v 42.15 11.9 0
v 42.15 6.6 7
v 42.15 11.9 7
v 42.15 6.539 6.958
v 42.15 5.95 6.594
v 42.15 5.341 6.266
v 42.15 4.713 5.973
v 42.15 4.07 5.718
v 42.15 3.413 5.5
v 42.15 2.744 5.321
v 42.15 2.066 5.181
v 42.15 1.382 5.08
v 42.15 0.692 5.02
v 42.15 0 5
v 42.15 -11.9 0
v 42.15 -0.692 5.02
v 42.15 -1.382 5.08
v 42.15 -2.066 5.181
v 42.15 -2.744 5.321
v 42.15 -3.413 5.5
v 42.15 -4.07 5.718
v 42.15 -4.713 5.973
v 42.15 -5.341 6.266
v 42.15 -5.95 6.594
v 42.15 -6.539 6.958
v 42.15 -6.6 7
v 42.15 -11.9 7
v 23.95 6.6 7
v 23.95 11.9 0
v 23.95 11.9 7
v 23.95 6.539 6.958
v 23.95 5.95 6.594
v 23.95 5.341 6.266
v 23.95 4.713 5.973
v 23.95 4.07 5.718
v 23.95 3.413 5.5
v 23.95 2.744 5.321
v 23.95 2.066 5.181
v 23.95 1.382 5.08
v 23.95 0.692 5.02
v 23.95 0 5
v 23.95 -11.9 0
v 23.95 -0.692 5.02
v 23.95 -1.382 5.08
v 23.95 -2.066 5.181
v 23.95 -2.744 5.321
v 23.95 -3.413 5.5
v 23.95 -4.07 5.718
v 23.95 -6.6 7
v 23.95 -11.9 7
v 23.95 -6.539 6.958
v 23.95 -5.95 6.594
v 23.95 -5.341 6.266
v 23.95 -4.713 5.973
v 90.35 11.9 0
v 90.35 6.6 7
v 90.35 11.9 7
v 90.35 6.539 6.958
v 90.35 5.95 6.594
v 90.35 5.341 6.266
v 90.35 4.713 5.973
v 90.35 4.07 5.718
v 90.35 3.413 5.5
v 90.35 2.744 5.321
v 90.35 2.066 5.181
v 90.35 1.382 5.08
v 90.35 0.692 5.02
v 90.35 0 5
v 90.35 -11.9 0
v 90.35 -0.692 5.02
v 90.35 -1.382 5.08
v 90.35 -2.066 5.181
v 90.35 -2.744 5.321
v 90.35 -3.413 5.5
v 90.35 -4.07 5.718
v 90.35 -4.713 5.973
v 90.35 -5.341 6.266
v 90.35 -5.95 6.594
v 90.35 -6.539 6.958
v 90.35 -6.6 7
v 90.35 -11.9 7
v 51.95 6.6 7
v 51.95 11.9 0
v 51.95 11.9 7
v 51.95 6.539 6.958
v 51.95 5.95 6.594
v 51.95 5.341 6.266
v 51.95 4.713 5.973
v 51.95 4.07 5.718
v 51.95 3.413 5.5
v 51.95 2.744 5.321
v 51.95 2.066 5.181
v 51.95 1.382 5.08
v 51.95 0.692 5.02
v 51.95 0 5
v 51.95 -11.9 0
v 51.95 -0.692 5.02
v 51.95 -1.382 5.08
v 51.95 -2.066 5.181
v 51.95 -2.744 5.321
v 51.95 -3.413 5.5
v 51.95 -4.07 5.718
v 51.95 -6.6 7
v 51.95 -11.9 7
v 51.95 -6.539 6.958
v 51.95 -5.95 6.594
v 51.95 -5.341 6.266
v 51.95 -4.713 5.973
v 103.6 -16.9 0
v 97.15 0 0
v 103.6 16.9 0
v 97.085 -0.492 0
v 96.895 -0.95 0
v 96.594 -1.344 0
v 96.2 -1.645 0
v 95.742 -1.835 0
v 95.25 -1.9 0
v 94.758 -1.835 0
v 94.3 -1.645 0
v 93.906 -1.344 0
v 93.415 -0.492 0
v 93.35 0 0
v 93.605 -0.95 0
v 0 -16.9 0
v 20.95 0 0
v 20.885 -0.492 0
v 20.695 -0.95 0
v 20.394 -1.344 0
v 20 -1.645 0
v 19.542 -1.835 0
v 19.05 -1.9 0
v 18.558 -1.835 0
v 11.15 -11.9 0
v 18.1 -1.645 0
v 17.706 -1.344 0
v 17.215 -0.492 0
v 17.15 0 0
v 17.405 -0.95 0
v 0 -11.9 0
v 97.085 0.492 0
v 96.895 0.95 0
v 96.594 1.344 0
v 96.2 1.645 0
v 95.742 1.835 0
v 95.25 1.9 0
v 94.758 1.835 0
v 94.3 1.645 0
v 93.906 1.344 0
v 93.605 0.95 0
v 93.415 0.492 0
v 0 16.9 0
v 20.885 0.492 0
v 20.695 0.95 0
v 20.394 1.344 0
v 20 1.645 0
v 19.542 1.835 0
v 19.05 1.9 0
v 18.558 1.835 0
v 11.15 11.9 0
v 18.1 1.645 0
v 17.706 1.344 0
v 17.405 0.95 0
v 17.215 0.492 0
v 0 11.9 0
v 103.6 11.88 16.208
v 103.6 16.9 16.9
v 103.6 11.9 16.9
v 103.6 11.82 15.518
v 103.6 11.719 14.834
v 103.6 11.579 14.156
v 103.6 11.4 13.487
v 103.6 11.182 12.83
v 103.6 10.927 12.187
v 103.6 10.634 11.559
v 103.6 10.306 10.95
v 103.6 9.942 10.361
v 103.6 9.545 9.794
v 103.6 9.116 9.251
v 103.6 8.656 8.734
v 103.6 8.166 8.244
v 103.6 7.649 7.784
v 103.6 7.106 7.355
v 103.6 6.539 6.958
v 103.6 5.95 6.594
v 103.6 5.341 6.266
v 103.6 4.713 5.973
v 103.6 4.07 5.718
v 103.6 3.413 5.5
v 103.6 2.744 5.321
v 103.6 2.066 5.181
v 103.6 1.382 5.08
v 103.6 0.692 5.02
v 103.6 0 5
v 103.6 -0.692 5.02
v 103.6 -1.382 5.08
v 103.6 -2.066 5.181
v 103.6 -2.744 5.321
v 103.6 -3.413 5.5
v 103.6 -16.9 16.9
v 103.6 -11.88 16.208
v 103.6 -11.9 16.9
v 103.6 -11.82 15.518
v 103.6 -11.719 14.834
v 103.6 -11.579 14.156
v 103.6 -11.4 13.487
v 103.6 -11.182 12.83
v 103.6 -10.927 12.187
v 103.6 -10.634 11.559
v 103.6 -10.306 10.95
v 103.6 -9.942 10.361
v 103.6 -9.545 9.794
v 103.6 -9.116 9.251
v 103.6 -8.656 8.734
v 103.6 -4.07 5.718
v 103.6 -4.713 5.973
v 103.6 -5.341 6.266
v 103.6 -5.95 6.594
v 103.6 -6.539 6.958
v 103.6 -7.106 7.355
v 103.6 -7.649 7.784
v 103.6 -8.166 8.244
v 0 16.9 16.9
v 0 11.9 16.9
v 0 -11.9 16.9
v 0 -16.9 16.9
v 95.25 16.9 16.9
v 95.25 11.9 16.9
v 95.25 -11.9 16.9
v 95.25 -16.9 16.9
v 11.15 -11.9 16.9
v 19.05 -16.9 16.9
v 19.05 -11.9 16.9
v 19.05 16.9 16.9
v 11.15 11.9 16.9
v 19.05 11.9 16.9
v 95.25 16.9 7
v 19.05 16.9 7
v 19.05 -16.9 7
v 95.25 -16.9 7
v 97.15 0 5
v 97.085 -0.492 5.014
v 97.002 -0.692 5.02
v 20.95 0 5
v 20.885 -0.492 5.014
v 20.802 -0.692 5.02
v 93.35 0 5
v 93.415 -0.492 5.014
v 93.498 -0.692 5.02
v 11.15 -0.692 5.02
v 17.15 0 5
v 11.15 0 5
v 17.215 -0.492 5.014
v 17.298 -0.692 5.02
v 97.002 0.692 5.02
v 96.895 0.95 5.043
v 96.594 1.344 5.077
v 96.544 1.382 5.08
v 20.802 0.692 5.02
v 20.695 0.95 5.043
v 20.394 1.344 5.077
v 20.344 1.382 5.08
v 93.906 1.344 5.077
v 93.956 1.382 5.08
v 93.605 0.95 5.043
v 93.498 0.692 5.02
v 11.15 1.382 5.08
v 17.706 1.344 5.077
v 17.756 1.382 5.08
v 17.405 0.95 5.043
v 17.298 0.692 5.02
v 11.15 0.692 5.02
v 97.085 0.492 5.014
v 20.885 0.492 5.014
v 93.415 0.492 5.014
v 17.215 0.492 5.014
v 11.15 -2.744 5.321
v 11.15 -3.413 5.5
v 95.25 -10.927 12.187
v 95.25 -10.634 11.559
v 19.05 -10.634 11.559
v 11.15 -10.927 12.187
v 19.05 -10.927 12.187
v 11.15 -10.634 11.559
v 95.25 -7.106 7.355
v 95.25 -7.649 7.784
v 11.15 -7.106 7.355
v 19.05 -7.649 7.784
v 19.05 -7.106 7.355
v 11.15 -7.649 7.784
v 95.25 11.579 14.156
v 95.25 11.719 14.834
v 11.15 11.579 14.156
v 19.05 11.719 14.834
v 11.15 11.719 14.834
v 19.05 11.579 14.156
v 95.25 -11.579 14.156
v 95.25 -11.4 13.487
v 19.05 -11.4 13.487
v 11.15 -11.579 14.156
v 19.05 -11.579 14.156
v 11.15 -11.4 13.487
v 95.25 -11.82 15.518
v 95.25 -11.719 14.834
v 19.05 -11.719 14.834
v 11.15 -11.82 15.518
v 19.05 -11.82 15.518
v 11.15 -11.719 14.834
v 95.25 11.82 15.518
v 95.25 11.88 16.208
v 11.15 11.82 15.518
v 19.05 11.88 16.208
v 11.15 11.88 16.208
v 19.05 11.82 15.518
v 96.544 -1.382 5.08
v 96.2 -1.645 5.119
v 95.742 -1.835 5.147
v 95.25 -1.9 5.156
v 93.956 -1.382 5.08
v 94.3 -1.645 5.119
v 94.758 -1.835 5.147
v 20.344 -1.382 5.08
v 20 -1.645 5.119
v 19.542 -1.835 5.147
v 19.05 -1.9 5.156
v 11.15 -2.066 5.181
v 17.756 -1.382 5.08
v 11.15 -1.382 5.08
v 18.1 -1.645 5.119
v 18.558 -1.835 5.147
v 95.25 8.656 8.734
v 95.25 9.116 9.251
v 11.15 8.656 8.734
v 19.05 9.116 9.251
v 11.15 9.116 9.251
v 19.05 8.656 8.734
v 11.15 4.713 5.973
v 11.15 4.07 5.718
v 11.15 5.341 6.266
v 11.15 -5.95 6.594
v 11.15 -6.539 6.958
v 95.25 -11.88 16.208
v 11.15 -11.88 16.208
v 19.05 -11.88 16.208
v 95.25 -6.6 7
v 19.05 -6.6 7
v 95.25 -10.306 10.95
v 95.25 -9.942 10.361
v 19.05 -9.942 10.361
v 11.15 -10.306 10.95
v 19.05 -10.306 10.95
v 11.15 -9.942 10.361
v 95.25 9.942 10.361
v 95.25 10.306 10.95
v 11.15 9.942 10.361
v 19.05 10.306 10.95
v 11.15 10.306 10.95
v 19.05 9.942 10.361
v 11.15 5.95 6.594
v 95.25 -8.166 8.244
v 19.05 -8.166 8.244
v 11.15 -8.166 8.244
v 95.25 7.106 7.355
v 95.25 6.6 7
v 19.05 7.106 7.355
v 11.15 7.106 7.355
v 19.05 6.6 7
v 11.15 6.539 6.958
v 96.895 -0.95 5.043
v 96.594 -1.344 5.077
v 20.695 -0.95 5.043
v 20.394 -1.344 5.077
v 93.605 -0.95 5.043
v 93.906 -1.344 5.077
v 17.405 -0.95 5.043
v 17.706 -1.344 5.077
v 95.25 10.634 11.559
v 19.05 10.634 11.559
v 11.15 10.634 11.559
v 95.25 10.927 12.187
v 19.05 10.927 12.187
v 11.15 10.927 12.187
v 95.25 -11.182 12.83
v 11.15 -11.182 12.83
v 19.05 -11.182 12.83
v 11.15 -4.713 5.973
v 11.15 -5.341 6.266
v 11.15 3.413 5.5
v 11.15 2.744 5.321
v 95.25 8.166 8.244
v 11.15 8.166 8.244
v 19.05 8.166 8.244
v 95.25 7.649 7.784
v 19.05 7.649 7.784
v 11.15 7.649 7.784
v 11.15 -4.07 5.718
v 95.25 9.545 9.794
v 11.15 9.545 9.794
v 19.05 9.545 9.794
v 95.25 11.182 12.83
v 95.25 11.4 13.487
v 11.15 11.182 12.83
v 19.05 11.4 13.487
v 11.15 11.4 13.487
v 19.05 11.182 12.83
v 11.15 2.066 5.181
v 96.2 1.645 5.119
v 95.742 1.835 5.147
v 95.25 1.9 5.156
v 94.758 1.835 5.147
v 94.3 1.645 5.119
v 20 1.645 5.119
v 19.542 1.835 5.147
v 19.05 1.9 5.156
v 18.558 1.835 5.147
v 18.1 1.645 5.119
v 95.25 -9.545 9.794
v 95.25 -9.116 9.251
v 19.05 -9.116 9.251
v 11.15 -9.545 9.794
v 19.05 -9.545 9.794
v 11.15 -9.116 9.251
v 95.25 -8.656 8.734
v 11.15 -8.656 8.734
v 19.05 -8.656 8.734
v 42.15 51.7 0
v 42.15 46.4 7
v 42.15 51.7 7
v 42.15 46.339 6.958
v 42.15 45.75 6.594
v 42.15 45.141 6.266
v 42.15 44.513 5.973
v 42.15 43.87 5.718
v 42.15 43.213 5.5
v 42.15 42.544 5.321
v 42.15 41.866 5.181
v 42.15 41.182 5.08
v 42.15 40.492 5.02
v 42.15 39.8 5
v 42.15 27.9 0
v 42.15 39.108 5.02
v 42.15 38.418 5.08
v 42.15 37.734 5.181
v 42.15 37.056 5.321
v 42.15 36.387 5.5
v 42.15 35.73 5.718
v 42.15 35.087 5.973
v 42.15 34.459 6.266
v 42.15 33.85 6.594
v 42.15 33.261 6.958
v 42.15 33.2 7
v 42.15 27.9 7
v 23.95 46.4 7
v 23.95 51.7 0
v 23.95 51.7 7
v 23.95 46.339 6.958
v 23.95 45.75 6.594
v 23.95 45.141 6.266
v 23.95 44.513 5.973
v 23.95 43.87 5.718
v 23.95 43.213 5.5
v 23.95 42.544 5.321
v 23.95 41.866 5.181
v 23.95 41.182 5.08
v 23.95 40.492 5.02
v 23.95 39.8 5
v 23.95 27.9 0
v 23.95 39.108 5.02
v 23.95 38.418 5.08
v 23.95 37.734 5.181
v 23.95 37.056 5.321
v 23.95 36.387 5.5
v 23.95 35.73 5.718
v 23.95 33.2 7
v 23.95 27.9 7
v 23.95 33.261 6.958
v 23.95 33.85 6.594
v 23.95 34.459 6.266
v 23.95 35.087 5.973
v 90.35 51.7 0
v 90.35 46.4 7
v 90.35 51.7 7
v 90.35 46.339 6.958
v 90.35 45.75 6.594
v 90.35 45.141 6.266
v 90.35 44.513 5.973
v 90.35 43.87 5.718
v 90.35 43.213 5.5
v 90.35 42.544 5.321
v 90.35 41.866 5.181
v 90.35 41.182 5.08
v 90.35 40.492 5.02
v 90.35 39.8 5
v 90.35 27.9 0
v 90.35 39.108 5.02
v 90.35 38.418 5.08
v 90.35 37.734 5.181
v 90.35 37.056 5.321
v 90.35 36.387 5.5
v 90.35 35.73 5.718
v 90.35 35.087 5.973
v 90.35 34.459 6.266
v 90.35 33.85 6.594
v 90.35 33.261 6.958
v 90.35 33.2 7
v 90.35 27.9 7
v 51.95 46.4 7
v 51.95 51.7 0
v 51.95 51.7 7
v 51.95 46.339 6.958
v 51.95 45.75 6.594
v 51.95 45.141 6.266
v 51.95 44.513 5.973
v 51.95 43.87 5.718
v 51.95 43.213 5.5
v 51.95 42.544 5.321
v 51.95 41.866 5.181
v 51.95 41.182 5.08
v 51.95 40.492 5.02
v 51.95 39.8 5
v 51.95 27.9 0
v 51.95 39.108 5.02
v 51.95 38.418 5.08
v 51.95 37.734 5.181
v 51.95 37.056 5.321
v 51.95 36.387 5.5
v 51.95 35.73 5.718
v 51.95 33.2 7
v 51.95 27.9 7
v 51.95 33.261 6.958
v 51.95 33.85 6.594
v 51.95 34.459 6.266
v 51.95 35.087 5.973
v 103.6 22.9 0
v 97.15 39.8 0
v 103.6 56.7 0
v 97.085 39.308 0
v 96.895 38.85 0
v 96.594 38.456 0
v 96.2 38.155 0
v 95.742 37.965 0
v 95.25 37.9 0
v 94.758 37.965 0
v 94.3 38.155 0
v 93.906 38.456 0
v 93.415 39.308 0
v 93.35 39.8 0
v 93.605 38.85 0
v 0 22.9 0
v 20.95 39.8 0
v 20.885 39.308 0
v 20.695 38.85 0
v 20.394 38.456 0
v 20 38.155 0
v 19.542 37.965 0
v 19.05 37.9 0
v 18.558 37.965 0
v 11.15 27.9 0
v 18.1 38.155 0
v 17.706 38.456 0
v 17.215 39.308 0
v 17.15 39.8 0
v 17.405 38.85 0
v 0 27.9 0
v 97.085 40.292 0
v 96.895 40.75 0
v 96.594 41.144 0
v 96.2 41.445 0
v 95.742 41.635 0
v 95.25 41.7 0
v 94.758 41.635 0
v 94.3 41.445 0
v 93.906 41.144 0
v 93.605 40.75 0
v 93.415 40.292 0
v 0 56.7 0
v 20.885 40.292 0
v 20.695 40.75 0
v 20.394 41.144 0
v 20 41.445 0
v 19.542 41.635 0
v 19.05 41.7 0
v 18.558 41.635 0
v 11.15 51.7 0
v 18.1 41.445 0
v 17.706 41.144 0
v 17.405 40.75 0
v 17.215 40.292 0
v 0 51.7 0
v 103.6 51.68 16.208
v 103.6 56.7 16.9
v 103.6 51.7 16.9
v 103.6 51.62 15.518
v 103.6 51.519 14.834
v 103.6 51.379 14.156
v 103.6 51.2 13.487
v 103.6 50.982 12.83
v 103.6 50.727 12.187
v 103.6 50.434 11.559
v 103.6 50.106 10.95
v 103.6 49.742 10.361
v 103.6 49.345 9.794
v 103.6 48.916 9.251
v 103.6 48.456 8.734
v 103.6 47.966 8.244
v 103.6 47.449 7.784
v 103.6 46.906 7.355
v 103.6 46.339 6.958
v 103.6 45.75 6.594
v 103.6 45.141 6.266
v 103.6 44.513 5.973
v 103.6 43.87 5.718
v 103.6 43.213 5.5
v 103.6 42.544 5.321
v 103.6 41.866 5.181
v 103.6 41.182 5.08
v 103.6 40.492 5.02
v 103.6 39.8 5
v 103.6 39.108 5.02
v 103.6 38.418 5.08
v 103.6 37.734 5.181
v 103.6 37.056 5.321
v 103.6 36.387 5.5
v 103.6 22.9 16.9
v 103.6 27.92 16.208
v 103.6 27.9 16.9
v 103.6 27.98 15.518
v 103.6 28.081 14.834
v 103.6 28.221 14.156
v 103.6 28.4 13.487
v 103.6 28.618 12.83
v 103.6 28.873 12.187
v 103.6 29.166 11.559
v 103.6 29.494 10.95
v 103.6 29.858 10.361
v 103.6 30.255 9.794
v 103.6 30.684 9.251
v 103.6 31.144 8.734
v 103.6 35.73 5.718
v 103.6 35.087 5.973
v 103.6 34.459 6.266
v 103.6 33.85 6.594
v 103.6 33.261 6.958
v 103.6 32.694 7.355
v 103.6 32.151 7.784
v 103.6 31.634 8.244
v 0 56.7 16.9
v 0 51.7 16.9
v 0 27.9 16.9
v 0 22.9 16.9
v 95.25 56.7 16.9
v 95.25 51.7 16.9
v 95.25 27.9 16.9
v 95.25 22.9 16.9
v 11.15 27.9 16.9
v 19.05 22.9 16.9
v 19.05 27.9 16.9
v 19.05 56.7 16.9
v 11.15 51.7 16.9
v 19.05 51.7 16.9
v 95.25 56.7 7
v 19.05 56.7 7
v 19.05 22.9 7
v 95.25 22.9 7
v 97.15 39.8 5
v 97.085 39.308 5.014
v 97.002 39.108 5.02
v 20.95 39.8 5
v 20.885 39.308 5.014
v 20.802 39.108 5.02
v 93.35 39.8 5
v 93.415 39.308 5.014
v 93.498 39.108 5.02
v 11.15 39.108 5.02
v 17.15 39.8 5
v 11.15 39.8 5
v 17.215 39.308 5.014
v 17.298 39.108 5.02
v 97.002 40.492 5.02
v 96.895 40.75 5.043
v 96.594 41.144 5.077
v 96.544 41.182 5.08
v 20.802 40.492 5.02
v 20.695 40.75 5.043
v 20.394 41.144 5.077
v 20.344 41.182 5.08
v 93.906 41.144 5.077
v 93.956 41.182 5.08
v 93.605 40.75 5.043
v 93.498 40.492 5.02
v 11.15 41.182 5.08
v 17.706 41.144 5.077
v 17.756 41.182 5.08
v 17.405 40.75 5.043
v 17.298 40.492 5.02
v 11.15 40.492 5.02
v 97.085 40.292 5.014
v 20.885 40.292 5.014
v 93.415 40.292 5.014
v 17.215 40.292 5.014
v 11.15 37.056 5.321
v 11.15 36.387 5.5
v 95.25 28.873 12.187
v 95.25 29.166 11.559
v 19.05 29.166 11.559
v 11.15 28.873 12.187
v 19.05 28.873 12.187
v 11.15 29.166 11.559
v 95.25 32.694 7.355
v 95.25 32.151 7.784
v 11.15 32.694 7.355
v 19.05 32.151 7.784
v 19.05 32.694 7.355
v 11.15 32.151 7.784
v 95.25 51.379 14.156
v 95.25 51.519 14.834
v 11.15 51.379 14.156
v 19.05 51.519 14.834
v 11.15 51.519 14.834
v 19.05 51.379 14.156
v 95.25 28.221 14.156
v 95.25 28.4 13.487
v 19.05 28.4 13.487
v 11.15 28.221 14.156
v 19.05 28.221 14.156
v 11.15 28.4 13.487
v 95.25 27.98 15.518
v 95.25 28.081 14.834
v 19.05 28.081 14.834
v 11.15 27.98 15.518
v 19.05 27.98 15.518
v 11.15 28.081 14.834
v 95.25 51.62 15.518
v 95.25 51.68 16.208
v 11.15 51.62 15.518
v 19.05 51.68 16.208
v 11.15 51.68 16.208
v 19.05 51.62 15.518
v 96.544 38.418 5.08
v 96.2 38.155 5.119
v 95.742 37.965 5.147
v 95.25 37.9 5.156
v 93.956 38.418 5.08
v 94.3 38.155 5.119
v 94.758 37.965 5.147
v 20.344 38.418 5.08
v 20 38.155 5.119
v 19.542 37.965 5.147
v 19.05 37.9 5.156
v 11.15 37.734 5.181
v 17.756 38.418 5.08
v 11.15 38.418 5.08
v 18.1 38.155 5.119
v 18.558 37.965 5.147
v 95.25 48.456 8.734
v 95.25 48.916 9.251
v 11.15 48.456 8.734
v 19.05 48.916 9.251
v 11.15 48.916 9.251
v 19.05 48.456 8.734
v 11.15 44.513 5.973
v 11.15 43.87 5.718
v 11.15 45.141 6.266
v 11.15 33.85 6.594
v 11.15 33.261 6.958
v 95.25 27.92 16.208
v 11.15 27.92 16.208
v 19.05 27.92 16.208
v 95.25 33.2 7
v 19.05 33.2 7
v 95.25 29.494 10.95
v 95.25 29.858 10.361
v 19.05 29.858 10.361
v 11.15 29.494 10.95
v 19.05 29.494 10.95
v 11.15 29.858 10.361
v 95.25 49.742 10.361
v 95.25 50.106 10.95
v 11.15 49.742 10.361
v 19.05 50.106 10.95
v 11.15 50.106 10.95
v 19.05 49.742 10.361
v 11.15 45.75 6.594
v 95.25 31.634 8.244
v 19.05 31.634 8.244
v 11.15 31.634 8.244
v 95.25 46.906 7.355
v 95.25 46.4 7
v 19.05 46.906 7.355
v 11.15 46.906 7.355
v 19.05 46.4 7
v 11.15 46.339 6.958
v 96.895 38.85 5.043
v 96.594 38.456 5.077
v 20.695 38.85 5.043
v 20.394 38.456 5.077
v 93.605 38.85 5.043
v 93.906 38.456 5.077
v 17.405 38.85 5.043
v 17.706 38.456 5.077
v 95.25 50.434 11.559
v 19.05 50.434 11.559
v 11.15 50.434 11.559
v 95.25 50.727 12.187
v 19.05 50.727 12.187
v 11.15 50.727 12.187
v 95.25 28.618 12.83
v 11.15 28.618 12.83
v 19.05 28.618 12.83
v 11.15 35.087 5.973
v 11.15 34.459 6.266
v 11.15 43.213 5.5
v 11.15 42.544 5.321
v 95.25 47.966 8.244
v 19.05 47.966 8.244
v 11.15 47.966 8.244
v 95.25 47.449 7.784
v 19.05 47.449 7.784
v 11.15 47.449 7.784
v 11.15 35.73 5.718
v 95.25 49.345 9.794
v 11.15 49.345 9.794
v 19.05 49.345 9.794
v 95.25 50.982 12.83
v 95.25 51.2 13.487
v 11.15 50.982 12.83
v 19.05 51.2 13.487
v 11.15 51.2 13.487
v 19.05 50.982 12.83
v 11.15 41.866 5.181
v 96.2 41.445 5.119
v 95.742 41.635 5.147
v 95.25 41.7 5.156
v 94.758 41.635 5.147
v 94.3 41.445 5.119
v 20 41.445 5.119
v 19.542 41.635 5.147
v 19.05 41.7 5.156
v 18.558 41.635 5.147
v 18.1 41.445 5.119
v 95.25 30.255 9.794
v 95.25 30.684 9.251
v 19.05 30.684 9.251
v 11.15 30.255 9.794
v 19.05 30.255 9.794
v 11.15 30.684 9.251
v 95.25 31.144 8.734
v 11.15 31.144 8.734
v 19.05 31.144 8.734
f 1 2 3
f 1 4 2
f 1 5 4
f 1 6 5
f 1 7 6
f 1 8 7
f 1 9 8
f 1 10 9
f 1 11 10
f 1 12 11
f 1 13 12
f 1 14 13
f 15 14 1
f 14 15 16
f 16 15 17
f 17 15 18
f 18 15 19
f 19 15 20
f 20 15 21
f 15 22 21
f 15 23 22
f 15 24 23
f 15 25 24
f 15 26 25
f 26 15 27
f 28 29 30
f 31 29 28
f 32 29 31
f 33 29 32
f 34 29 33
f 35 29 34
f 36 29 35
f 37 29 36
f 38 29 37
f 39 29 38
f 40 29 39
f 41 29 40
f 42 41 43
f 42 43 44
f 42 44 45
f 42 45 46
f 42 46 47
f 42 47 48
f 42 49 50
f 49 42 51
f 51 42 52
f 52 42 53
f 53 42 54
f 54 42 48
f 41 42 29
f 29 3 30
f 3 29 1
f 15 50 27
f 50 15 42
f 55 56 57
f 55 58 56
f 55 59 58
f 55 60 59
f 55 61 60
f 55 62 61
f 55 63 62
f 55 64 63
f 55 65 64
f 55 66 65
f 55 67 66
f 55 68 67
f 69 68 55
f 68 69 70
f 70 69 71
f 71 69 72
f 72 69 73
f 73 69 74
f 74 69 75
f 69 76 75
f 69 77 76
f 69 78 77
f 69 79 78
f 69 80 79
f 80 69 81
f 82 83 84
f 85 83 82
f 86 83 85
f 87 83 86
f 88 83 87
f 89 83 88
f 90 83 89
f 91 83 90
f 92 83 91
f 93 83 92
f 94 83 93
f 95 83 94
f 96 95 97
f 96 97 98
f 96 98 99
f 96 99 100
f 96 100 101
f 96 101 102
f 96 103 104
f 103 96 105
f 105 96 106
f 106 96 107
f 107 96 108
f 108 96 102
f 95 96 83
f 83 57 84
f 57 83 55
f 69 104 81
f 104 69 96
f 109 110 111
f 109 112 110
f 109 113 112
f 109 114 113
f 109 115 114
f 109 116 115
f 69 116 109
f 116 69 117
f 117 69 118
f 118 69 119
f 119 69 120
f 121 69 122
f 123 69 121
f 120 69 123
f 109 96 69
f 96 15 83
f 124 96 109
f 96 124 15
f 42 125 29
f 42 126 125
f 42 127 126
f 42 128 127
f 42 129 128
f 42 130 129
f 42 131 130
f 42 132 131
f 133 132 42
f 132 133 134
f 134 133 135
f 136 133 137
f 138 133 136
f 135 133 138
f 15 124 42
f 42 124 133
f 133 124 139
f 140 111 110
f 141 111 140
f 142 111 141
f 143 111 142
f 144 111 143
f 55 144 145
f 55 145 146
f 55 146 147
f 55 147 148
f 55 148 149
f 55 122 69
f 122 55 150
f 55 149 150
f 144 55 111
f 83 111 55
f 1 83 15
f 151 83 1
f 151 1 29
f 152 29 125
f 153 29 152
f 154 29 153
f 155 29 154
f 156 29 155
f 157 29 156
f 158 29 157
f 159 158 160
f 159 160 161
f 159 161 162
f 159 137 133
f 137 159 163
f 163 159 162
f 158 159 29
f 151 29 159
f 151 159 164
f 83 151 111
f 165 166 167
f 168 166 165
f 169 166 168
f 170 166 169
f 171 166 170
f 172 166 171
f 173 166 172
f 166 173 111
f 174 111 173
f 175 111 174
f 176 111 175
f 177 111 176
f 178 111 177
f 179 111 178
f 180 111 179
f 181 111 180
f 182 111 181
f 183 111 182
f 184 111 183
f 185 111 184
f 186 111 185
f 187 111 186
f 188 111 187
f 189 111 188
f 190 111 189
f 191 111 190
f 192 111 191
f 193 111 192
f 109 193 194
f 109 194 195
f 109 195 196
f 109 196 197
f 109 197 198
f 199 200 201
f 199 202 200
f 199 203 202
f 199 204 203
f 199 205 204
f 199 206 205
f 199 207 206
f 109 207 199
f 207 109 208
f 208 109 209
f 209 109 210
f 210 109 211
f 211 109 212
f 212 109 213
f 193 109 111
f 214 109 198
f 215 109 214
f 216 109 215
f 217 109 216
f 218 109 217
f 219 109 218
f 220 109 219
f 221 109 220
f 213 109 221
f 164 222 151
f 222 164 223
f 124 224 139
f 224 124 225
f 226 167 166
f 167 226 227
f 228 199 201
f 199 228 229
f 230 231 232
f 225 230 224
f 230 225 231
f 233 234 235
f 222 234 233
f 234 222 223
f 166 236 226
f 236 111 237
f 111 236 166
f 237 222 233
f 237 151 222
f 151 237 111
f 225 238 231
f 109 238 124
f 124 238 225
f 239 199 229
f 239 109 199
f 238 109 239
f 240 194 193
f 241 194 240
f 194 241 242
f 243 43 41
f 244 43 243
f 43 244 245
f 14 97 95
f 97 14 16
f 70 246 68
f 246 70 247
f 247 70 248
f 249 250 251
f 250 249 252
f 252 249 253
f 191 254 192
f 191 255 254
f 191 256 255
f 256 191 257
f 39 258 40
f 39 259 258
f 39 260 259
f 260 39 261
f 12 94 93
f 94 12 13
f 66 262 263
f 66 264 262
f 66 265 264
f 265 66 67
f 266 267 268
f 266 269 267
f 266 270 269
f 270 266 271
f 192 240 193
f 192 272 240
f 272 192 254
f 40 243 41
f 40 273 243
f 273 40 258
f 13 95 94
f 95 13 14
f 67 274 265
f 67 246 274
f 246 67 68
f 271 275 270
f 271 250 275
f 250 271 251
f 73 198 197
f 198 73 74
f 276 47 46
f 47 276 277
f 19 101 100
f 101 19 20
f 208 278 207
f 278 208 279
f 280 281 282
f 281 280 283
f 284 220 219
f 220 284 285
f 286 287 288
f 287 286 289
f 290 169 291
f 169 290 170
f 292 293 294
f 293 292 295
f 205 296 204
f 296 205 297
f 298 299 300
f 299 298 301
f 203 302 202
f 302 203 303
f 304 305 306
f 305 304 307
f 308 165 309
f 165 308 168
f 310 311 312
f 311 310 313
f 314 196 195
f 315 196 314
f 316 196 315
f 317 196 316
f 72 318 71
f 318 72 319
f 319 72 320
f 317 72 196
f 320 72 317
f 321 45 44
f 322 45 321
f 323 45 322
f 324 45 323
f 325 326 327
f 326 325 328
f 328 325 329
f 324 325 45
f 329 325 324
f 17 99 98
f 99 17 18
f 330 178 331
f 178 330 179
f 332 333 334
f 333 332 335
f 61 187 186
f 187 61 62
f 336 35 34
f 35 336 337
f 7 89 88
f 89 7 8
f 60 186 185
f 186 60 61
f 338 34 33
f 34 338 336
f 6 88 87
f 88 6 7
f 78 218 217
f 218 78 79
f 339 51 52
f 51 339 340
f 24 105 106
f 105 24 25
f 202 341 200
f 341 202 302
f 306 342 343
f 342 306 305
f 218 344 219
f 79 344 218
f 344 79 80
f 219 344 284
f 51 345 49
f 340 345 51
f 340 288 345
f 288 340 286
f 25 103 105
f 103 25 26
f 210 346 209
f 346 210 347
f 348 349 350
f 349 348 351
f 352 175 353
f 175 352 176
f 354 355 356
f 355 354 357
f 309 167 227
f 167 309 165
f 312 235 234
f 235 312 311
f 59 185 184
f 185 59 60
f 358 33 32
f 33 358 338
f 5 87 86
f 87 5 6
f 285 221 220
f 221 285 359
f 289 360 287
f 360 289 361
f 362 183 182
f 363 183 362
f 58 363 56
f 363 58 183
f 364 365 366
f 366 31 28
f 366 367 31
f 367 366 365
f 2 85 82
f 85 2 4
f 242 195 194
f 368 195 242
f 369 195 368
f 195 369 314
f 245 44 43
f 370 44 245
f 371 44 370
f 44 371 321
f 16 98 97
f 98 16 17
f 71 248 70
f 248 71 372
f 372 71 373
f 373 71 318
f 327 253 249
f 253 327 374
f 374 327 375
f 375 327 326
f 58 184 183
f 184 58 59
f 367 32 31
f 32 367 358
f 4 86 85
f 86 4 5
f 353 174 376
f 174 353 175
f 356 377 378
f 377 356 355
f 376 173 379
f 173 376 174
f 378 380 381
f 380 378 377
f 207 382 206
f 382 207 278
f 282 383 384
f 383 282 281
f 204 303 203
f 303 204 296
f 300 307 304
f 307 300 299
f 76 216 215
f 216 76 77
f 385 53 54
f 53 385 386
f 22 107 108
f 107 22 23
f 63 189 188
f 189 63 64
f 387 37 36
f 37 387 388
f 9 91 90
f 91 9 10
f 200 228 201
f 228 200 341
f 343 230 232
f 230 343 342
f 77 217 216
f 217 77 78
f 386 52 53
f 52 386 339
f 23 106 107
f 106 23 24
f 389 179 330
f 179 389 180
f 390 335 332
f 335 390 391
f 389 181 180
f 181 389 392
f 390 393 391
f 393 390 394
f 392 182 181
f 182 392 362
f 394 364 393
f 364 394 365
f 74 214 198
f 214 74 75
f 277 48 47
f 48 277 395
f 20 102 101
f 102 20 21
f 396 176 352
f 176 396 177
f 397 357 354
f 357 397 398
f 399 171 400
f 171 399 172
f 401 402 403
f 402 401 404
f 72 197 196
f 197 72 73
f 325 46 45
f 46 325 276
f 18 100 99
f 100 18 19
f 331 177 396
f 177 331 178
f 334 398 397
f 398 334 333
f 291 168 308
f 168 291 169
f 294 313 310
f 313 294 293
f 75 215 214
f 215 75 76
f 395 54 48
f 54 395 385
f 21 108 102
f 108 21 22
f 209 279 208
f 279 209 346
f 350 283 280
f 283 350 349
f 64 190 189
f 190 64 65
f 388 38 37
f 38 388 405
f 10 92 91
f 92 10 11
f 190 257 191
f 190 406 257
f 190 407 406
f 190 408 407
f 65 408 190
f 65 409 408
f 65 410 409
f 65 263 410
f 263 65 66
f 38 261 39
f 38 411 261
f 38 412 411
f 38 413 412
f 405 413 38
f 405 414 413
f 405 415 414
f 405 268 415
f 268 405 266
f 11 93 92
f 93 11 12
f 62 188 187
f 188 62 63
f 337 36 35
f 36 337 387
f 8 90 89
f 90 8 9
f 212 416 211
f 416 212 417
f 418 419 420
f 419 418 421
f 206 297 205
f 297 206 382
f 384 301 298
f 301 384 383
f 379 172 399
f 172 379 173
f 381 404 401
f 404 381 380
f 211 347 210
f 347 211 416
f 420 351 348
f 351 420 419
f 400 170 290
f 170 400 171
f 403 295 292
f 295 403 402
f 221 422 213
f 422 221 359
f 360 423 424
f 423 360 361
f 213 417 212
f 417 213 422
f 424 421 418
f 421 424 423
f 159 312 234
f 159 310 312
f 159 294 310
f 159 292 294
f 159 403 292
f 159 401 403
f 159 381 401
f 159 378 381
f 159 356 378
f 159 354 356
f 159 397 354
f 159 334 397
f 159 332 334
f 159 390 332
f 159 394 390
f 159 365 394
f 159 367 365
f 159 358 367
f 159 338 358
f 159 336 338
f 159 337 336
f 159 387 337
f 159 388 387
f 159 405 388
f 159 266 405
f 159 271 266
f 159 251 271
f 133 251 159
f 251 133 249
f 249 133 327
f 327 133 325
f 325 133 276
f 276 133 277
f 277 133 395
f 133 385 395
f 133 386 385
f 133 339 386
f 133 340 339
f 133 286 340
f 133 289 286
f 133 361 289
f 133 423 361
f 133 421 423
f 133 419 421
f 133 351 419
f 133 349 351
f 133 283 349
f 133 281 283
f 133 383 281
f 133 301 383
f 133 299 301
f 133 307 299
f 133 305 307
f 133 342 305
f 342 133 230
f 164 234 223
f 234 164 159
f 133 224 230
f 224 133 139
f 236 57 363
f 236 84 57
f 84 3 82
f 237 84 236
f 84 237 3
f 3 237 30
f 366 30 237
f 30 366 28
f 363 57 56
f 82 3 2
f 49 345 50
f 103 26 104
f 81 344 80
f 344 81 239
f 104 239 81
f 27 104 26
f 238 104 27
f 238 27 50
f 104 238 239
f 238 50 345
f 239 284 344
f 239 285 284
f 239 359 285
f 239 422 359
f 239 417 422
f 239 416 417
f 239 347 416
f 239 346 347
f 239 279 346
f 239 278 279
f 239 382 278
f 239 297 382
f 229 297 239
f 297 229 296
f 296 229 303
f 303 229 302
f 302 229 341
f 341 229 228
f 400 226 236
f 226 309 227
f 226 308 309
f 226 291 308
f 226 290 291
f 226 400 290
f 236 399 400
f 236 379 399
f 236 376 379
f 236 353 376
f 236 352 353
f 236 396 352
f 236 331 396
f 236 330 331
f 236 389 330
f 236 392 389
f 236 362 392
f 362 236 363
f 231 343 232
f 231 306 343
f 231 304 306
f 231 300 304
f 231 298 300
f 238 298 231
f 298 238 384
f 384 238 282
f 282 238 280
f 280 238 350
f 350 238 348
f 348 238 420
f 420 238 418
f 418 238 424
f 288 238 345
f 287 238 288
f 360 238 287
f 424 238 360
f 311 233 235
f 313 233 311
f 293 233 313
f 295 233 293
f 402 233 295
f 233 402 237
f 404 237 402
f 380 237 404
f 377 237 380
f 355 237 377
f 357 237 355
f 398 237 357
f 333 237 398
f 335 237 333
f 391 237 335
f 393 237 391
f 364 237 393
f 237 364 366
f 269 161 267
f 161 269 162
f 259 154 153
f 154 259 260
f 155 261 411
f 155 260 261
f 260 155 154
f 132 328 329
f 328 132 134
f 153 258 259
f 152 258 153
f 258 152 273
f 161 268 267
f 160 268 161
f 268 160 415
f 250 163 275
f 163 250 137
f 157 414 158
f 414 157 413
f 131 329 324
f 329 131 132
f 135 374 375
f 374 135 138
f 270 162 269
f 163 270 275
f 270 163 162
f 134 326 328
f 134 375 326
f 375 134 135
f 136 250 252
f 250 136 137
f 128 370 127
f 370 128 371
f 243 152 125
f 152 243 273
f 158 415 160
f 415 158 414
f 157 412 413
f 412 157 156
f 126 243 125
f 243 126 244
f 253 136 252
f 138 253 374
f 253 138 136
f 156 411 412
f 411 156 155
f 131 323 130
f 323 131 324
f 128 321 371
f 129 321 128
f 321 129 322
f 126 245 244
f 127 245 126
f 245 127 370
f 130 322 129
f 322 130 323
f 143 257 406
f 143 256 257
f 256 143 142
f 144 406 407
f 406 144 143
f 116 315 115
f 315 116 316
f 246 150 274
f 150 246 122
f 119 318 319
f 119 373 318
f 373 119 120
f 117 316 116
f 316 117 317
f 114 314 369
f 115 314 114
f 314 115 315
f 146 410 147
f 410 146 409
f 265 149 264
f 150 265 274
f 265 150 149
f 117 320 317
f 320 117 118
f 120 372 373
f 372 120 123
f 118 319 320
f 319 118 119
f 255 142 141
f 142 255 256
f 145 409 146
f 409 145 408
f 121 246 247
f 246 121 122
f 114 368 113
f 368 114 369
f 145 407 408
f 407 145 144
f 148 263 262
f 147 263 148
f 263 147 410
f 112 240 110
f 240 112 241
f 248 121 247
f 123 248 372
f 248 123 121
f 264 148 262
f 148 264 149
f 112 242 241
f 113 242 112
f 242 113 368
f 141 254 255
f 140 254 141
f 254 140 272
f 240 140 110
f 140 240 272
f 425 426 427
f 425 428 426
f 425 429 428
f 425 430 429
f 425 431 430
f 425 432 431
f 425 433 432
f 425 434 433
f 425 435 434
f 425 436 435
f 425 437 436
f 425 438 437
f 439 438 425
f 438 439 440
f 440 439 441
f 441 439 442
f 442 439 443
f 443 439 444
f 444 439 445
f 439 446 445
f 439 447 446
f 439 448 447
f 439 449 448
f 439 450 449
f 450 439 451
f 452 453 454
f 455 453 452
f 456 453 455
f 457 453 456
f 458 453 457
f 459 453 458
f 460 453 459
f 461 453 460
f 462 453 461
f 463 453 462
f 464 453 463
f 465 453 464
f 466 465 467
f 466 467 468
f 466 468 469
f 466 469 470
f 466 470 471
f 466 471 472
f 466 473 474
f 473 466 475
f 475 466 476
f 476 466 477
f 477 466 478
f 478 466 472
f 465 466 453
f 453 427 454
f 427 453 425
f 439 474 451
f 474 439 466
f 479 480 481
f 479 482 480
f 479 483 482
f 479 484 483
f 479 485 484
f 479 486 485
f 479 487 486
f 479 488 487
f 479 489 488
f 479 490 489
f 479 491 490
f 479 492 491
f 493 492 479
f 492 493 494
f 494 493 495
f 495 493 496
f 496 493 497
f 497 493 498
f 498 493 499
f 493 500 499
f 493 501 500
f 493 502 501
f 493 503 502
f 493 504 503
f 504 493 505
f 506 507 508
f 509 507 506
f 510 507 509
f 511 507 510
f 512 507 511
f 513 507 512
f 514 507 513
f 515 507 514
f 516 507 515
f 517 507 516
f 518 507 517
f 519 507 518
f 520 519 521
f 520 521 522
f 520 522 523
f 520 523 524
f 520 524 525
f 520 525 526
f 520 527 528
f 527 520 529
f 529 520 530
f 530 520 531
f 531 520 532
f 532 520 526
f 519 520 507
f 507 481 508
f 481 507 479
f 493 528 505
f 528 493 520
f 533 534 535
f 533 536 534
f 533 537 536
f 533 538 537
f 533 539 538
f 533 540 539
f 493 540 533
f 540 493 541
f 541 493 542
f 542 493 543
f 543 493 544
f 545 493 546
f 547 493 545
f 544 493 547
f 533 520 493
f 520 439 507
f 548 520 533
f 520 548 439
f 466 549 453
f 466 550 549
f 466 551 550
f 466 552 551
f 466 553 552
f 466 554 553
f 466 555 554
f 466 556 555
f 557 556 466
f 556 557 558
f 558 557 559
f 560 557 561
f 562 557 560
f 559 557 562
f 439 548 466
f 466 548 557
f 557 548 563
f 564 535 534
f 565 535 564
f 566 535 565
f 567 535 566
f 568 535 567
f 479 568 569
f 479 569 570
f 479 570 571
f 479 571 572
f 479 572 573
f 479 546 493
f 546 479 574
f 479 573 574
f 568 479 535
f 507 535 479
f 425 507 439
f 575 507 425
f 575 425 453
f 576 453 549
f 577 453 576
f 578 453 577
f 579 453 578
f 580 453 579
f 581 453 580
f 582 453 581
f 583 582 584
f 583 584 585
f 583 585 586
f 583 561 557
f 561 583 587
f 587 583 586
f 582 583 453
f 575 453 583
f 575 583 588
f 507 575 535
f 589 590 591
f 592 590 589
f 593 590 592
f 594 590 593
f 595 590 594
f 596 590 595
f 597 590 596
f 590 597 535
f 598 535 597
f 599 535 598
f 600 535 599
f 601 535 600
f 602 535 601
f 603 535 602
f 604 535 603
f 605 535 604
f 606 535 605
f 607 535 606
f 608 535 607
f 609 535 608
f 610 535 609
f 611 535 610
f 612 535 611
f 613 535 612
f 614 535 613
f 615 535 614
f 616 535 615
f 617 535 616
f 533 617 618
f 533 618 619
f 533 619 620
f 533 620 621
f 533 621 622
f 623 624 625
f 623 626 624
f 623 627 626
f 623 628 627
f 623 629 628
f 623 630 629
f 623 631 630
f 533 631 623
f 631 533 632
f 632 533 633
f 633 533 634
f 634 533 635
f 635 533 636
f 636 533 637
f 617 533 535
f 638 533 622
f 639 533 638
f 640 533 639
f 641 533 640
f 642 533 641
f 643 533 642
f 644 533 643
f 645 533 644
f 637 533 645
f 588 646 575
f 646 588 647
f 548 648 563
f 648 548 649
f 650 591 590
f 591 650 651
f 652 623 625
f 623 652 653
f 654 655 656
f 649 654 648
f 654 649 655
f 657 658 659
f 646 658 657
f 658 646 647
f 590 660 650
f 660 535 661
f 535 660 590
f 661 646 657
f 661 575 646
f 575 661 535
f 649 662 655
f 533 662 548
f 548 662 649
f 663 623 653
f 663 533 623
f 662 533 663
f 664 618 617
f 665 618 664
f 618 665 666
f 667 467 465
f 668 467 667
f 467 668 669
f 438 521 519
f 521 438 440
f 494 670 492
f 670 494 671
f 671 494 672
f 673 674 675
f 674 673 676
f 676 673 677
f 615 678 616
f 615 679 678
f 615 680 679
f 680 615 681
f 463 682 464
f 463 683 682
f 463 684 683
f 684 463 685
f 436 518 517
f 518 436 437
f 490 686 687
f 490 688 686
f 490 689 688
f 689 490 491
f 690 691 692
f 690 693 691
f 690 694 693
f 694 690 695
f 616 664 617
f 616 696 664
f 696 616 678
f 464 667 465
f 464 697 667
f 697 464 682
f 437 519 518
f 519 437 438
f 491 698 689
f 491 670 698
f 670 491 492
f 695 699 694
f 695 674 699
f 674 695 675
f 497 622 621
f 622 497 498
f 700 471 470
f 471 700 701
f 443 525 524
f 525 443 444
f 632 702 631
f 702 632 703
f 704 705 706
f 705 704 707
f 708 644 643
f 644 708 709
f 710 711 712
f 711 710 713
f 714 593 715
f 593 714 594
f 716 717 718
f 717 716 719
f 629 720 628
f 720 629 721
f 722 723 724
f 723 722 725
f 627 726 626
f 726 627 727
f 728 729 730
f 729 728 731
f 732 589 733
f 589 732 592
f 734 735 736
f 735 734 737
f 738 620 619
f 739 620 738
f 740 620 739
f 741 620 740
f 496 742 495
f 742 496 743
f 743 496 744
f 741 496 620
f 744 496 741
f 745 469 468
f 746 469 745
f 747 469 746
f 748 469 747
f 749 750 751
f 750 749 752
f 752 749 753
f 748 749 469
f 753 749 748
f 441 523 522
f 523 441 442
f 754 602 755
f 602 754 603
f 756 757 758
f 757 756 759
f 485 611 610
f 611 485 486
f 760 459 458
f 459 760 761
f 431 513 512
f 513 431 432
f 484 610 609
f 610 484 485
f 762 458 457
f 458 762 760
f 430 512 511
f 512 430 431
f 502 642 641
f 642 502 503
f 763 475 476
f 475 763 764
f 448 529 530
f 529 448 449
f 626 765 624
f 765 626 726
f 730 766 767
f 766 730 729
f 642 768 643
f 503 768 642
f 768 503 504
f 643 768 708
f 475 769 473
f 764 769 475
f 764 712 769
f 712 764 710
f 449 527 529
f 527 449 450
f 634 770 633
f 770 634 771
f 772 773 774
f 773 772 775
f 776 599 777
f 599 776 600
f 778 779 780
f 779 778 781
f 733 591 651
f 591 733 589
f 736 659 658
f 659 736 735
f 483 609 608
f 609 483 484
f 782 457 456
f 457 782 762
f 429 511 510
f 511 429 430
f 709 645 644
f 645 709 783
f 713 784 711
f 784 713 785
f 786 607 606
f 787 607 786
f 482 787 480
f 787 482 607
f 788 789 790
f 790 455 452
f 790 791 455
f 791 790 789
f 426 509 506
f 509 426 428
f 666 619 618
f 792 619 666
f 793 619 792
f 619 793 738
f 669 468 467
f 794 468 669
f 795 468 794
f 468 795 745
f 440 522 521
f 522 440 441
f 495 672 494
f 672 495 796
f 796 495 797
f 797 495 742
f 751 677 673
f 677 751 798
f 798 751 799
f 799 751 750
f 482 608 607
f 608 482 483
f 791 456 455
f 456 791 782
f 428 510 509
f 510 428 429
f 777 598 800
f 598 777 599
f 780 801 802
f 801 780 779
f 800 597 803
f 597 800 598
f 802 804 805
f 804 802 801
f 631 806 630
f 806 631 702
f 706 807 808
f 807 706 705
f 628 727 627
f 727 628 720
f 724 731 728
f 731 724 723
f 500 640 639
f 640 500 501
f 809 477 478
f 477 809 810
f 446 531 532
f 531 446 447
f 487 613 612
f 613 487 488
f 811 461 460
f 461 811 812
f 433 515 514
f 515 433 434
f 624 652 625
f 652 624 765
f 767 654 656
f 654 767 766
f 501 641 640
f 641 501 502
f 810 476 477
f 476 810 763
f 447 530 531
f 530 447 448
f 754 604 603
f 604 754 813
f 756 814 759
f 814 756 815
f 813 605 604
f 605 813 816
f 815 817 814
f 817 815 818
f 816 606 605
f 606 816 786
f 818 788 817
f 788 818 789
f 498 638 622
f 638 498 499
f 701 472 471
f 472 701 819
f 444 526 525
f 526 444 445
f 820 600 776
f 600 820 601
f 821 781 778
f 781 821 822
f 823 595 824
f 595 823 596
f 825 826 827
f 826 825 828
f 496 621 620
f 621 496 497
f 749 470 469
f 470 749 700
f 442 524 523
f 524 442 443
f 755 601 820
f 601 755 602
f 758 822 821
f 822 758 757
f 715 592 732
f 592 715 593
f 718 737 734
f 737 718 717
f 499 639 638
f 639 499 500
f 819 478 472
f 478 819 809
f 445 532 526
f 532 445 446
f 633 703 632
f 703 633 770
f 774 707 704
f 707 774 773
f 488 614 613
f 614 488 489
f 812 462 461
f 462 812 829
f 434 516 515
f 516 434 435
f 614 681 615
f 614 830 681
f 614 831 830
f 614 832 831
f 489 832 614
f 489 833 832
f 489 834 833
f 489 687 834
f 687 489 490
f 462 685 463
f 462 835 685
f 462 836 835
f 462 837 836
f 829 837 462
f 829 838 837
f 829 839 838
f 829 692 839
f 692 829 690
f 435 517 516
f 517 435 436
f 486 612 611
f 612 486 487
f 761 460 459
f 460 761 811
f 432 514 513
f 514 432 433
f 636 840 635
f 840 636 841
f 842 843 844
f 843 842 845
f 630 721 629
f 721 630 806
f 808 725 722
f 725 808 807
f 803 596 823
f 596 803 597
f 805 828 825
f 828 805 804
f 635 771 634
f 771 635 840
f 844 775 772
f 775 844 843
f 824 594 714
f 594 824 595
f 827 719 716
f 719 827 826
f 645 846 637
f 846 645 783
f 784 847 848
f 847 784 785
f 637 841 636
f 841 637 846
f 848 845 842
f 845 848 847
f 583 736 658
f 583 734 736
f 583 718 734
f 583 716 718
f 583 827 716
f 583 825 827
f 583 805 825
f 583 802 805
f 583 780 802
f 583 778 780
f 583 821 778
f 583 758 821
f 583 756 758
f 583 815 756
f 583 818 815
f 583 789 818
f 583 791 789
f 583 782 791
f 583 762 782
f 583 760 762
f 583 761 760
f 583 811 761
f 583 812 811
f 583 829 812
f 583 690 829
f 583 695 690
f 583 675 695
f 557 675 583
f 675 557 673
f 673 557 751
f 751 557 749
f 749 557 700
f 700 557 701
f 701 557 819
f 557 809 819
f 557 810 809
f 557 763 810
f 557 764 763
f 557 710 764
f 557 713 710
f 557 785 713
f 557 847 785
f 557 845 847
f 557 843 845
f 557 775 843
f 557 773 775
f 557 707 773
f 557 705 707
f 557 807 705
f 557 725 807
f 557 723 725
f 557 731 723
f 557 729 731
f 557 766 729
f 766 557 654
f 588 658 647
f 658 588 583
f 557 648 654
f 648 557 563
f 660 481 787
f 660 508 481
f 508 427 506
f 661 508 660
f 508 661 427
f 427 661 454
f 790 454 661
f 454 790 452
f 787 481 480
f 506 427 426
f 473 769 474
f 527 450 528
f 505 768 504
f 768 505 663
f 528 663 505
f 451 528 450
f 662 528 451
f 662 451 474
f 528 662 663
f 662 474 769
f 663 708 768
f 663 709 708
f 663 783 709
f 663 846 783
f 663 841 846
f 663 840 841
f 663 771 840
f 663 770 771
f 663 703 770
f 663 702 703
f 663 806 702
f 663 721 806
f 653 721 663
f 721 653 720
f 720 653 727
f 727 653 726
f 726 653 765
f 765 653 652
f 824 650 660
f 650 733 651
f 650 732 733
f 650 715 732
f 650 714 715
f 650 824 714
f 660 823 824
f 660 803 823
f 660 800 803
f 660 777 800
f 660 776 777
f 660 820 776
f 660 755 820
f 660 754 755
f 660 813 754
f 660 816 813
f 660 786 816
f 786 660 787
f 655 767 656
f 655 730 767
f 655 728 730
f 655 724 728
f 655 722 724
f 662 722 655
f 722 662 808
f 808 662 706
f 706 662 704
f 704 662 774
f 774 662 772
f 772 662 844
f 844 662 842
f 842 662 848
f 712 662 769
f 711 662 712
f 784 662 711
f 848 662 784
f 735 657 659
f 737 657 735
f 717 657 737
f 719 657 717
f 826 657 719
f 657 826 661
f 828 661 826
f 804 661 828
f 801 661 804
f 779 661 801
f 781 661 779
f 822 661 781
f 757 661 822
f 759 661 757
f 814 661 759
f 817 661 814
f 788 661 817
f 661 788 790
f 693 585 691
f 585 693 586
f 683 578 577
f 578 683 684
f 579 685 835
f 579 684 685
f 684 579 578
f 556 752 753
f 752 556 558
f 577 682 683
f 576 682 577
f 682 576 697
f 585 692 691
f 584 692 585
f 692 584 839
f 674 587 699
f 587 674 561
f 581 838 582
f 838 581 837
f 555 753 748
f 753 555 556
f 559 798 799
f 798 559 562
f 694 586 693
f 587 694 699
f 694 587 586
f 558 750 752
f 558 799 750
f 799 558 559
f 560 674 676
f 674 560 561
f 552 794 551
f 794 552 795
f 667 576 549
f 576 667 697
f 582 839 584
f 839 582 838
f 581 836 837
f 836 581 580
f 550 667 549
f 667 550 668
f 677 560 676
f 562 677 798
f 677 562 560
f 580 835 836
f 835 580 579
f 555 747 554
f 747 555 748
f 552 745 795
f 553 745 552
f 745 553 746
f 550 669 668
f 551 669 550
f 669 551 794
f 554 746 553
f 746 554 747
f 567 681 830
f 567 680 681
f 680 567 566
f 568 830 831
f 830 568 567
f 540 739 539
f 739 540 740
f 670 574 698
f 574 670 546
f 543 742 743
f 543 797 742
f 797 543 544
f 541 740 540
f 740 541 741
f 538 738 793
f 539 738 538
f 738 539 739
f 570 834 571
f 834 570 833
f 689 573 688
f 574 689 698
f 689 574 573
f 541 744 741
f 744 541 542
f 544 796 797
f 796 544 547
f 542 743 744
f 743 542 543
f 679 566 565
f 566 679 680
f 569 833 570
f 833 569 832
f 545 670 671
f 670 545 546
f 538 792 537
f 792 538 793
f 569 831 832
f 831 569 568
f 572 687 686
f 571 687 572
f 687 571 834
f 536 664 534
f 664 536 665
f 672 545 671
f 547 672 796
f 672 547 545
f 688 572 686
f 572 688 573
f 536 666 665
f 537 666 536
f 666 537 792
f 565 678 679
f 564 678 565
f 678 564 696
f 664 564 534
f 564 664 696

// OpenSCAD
//Drill guide for Mostly Printed CNC Z Pipe
//7/3/2015  By: David Bunch
//Revised center cuts for larger Diameter holes to work better
//
//Revised 10/4/2015
//Designed for Bosch Toolholder with Dust cover using 2 parts
//76.25mm 1st & 3rd hole
//28.01mm 1st & 2nd hole
//48.24mm 2nd & 3rd hole

//Revised 8/5/2017 to make Wall thickness & Base Thickness separate variables & fixed one bug

//CUSTOMIZER VARIABLES

//1. Spacing between Nuts (Standard is 76.2mm)
NutSpacing = 76.2;      //(I used 53mm for the rotary tool I am using)

//2. Spacing between 1st & 2nd Nut
NutSpacing2 = 28;    //Use 0 if only using 2 nuts

//3. Dia of Drill Hole (9/64" Drill bit, Added .2mm for slip fit)
//M3 = 3.8;
DrSize = 3.8;

//4. Pipe Dia. to Use (Added 0.8 for slight tight fit)
OD = 23.8;              //23.7mm was a little tight & 24.0 was a little loose for me

//5. Thickness at bottom of Pipe
Thickness = 5;

//6. Thickness of Walls on each side of pipe
Wall_Thk = 5;

//7. Resolution of Pipe (108 gives .688mm length segments)
Pipe_res = 108;

//8. Resolution of holes (24 gives .497mm length segments)
Hole_res = 24;

//9. Offset from Left for 1st Nut Trap
LtNutOffset = 19.05;      //Original Design is 19.05mm

//10. Offset from Right of 2nd Nut Trap (Original is 6.35mm)
RtNutOffset = 8.35;       //(I decided to add 2mm to this gap)

//11. Center Clamp Width
Cl_Wid = 6;

//12. Number of Holes (1, 2 or 3)
Num_Holes=2;        //I needed 3 for the Bosch quick disconnect mount

//13. Print 1 or 2 Nut Traps
Qty = 2;

//CUSTOMIZER VARIABLES END
//----------------------------------------
//Begin calculations based on input variables
MidNutOffset = LtNutOffset + NutSpacing2;
echo("MidNutOffset = ", MidNutOffset);
TotCenGap=NutSpacing - DrSize - 12;         //I use 6mm plastic around holes
echo("TotCenGap = ",TotCenGap);

DrRad = DrSize / 2;
echo("DrRad = ", DrRad);
THK = OD /2 + Thickness;

DrLen = OD + Thickness + Thickness+2;

echo("THK = ",THK);

Width = OD + Wall_Thk + Wall_Thk;
echo("Width = ",Width);

WidSlice = Width + 2;
Rad = OD / 2;
echo("Rad = ", Rad);

Ht = LtNutOffset + NutSpacing + RtNutOffset;
echo("Ht = ", Ht);

CenCub_Z2 = LtNutOffset + DrRad + 3;         //6mm of plastic each side of hole

CenCub_Z1 = MidNutOffset + DrRad + 3;

CenCubLen1 = NutSpacing - NutSpacing2 - (6 + DrSize);                     //Use this if Cl_Wid = 0;
//CenCubLen2 = (TotCenGap - Cl_Wid) / 2;
CenCubLen2 = NutSpacing2 - (6 + DrSize);

echo("CenCubLen1 = ", CenCubLen1);
echo("CenCubLen2 = ", CenCubLen2);
//translate([LtNutOffset,0,0])
//%cube([DrRad + 3,4,10]);
module Base()
{
    translate([0,0,THK])
    rotate([0,90,0])
    difference()
    {
        translate([0,-Width/2,0])
        cube([THK,Width,Ht]);                   //Basic starting cube
        translate([0,0,-1])
        cylinder(d=OD,h=Ht+2,$fn=Pipe_res);     //Cut for where pipe is laid
        if (Cl_Wid > 0)
        {
            translate([-1,-Rad,CenCub_Z2])
            cube([THK+2,OD,CenCubLen2]);           //cube cut out of 1st part of center
            translate([-1,-Rad,CenCub_Z1])
            cube([THK+2,OD,CenCubLen1]);           //cube cut out of 2nd part of center
        } else {
            translate([-1,-Rad,CenCub_Z])
            cube([OD,OD,CenCubLen1]);          //cube cut out of center
        }
        translate([-1,-Rad,-1])
        cube([THK+2,OD,(LtNutOffset - DrRad - 6) + 1]);         //Slice a cube cut at left side
        translate([-(Thickness+2),-(WidSlice/2),LtNutOffset])
        cube([THK,WidSlice,NutSpacing]);        //Slice across Top for less plastic

        translate([0,0,LtNutOffset])
        rotate([0,90,0])
        cylinder(d=DrSize,h=DrLen,center=true,$fn=Hole_res);       //Drill Bottom Hole
        if (Num_Holes == 3)
        {
            translate([0,0,LtNutOffset+NutSpacing2])
            rotate([0,90,0])
            cylinder(d=DrSize,h=DrLen,center=true,$fn=Hole_res);       //Drill Middle Hole
        }
        if (Num_Holes > 1)
        {
                translate([0,0,LtNutOffset+NutSpacing])
                rotate([0,90,0])
                cylinder(d=DrSize,h=DrLen,center=true,$fn=Hole_res);    //Drill Top Hole
        }
    }
}
            //translate([-1,-Rad,CenCub_Z])
            //cube([OD,OD,CenCubLen2]);           //cube cut out of 1st part of center
Base();
if (Qty == 2)
{
    translate([0,Width+6,0])
    Base();
}
